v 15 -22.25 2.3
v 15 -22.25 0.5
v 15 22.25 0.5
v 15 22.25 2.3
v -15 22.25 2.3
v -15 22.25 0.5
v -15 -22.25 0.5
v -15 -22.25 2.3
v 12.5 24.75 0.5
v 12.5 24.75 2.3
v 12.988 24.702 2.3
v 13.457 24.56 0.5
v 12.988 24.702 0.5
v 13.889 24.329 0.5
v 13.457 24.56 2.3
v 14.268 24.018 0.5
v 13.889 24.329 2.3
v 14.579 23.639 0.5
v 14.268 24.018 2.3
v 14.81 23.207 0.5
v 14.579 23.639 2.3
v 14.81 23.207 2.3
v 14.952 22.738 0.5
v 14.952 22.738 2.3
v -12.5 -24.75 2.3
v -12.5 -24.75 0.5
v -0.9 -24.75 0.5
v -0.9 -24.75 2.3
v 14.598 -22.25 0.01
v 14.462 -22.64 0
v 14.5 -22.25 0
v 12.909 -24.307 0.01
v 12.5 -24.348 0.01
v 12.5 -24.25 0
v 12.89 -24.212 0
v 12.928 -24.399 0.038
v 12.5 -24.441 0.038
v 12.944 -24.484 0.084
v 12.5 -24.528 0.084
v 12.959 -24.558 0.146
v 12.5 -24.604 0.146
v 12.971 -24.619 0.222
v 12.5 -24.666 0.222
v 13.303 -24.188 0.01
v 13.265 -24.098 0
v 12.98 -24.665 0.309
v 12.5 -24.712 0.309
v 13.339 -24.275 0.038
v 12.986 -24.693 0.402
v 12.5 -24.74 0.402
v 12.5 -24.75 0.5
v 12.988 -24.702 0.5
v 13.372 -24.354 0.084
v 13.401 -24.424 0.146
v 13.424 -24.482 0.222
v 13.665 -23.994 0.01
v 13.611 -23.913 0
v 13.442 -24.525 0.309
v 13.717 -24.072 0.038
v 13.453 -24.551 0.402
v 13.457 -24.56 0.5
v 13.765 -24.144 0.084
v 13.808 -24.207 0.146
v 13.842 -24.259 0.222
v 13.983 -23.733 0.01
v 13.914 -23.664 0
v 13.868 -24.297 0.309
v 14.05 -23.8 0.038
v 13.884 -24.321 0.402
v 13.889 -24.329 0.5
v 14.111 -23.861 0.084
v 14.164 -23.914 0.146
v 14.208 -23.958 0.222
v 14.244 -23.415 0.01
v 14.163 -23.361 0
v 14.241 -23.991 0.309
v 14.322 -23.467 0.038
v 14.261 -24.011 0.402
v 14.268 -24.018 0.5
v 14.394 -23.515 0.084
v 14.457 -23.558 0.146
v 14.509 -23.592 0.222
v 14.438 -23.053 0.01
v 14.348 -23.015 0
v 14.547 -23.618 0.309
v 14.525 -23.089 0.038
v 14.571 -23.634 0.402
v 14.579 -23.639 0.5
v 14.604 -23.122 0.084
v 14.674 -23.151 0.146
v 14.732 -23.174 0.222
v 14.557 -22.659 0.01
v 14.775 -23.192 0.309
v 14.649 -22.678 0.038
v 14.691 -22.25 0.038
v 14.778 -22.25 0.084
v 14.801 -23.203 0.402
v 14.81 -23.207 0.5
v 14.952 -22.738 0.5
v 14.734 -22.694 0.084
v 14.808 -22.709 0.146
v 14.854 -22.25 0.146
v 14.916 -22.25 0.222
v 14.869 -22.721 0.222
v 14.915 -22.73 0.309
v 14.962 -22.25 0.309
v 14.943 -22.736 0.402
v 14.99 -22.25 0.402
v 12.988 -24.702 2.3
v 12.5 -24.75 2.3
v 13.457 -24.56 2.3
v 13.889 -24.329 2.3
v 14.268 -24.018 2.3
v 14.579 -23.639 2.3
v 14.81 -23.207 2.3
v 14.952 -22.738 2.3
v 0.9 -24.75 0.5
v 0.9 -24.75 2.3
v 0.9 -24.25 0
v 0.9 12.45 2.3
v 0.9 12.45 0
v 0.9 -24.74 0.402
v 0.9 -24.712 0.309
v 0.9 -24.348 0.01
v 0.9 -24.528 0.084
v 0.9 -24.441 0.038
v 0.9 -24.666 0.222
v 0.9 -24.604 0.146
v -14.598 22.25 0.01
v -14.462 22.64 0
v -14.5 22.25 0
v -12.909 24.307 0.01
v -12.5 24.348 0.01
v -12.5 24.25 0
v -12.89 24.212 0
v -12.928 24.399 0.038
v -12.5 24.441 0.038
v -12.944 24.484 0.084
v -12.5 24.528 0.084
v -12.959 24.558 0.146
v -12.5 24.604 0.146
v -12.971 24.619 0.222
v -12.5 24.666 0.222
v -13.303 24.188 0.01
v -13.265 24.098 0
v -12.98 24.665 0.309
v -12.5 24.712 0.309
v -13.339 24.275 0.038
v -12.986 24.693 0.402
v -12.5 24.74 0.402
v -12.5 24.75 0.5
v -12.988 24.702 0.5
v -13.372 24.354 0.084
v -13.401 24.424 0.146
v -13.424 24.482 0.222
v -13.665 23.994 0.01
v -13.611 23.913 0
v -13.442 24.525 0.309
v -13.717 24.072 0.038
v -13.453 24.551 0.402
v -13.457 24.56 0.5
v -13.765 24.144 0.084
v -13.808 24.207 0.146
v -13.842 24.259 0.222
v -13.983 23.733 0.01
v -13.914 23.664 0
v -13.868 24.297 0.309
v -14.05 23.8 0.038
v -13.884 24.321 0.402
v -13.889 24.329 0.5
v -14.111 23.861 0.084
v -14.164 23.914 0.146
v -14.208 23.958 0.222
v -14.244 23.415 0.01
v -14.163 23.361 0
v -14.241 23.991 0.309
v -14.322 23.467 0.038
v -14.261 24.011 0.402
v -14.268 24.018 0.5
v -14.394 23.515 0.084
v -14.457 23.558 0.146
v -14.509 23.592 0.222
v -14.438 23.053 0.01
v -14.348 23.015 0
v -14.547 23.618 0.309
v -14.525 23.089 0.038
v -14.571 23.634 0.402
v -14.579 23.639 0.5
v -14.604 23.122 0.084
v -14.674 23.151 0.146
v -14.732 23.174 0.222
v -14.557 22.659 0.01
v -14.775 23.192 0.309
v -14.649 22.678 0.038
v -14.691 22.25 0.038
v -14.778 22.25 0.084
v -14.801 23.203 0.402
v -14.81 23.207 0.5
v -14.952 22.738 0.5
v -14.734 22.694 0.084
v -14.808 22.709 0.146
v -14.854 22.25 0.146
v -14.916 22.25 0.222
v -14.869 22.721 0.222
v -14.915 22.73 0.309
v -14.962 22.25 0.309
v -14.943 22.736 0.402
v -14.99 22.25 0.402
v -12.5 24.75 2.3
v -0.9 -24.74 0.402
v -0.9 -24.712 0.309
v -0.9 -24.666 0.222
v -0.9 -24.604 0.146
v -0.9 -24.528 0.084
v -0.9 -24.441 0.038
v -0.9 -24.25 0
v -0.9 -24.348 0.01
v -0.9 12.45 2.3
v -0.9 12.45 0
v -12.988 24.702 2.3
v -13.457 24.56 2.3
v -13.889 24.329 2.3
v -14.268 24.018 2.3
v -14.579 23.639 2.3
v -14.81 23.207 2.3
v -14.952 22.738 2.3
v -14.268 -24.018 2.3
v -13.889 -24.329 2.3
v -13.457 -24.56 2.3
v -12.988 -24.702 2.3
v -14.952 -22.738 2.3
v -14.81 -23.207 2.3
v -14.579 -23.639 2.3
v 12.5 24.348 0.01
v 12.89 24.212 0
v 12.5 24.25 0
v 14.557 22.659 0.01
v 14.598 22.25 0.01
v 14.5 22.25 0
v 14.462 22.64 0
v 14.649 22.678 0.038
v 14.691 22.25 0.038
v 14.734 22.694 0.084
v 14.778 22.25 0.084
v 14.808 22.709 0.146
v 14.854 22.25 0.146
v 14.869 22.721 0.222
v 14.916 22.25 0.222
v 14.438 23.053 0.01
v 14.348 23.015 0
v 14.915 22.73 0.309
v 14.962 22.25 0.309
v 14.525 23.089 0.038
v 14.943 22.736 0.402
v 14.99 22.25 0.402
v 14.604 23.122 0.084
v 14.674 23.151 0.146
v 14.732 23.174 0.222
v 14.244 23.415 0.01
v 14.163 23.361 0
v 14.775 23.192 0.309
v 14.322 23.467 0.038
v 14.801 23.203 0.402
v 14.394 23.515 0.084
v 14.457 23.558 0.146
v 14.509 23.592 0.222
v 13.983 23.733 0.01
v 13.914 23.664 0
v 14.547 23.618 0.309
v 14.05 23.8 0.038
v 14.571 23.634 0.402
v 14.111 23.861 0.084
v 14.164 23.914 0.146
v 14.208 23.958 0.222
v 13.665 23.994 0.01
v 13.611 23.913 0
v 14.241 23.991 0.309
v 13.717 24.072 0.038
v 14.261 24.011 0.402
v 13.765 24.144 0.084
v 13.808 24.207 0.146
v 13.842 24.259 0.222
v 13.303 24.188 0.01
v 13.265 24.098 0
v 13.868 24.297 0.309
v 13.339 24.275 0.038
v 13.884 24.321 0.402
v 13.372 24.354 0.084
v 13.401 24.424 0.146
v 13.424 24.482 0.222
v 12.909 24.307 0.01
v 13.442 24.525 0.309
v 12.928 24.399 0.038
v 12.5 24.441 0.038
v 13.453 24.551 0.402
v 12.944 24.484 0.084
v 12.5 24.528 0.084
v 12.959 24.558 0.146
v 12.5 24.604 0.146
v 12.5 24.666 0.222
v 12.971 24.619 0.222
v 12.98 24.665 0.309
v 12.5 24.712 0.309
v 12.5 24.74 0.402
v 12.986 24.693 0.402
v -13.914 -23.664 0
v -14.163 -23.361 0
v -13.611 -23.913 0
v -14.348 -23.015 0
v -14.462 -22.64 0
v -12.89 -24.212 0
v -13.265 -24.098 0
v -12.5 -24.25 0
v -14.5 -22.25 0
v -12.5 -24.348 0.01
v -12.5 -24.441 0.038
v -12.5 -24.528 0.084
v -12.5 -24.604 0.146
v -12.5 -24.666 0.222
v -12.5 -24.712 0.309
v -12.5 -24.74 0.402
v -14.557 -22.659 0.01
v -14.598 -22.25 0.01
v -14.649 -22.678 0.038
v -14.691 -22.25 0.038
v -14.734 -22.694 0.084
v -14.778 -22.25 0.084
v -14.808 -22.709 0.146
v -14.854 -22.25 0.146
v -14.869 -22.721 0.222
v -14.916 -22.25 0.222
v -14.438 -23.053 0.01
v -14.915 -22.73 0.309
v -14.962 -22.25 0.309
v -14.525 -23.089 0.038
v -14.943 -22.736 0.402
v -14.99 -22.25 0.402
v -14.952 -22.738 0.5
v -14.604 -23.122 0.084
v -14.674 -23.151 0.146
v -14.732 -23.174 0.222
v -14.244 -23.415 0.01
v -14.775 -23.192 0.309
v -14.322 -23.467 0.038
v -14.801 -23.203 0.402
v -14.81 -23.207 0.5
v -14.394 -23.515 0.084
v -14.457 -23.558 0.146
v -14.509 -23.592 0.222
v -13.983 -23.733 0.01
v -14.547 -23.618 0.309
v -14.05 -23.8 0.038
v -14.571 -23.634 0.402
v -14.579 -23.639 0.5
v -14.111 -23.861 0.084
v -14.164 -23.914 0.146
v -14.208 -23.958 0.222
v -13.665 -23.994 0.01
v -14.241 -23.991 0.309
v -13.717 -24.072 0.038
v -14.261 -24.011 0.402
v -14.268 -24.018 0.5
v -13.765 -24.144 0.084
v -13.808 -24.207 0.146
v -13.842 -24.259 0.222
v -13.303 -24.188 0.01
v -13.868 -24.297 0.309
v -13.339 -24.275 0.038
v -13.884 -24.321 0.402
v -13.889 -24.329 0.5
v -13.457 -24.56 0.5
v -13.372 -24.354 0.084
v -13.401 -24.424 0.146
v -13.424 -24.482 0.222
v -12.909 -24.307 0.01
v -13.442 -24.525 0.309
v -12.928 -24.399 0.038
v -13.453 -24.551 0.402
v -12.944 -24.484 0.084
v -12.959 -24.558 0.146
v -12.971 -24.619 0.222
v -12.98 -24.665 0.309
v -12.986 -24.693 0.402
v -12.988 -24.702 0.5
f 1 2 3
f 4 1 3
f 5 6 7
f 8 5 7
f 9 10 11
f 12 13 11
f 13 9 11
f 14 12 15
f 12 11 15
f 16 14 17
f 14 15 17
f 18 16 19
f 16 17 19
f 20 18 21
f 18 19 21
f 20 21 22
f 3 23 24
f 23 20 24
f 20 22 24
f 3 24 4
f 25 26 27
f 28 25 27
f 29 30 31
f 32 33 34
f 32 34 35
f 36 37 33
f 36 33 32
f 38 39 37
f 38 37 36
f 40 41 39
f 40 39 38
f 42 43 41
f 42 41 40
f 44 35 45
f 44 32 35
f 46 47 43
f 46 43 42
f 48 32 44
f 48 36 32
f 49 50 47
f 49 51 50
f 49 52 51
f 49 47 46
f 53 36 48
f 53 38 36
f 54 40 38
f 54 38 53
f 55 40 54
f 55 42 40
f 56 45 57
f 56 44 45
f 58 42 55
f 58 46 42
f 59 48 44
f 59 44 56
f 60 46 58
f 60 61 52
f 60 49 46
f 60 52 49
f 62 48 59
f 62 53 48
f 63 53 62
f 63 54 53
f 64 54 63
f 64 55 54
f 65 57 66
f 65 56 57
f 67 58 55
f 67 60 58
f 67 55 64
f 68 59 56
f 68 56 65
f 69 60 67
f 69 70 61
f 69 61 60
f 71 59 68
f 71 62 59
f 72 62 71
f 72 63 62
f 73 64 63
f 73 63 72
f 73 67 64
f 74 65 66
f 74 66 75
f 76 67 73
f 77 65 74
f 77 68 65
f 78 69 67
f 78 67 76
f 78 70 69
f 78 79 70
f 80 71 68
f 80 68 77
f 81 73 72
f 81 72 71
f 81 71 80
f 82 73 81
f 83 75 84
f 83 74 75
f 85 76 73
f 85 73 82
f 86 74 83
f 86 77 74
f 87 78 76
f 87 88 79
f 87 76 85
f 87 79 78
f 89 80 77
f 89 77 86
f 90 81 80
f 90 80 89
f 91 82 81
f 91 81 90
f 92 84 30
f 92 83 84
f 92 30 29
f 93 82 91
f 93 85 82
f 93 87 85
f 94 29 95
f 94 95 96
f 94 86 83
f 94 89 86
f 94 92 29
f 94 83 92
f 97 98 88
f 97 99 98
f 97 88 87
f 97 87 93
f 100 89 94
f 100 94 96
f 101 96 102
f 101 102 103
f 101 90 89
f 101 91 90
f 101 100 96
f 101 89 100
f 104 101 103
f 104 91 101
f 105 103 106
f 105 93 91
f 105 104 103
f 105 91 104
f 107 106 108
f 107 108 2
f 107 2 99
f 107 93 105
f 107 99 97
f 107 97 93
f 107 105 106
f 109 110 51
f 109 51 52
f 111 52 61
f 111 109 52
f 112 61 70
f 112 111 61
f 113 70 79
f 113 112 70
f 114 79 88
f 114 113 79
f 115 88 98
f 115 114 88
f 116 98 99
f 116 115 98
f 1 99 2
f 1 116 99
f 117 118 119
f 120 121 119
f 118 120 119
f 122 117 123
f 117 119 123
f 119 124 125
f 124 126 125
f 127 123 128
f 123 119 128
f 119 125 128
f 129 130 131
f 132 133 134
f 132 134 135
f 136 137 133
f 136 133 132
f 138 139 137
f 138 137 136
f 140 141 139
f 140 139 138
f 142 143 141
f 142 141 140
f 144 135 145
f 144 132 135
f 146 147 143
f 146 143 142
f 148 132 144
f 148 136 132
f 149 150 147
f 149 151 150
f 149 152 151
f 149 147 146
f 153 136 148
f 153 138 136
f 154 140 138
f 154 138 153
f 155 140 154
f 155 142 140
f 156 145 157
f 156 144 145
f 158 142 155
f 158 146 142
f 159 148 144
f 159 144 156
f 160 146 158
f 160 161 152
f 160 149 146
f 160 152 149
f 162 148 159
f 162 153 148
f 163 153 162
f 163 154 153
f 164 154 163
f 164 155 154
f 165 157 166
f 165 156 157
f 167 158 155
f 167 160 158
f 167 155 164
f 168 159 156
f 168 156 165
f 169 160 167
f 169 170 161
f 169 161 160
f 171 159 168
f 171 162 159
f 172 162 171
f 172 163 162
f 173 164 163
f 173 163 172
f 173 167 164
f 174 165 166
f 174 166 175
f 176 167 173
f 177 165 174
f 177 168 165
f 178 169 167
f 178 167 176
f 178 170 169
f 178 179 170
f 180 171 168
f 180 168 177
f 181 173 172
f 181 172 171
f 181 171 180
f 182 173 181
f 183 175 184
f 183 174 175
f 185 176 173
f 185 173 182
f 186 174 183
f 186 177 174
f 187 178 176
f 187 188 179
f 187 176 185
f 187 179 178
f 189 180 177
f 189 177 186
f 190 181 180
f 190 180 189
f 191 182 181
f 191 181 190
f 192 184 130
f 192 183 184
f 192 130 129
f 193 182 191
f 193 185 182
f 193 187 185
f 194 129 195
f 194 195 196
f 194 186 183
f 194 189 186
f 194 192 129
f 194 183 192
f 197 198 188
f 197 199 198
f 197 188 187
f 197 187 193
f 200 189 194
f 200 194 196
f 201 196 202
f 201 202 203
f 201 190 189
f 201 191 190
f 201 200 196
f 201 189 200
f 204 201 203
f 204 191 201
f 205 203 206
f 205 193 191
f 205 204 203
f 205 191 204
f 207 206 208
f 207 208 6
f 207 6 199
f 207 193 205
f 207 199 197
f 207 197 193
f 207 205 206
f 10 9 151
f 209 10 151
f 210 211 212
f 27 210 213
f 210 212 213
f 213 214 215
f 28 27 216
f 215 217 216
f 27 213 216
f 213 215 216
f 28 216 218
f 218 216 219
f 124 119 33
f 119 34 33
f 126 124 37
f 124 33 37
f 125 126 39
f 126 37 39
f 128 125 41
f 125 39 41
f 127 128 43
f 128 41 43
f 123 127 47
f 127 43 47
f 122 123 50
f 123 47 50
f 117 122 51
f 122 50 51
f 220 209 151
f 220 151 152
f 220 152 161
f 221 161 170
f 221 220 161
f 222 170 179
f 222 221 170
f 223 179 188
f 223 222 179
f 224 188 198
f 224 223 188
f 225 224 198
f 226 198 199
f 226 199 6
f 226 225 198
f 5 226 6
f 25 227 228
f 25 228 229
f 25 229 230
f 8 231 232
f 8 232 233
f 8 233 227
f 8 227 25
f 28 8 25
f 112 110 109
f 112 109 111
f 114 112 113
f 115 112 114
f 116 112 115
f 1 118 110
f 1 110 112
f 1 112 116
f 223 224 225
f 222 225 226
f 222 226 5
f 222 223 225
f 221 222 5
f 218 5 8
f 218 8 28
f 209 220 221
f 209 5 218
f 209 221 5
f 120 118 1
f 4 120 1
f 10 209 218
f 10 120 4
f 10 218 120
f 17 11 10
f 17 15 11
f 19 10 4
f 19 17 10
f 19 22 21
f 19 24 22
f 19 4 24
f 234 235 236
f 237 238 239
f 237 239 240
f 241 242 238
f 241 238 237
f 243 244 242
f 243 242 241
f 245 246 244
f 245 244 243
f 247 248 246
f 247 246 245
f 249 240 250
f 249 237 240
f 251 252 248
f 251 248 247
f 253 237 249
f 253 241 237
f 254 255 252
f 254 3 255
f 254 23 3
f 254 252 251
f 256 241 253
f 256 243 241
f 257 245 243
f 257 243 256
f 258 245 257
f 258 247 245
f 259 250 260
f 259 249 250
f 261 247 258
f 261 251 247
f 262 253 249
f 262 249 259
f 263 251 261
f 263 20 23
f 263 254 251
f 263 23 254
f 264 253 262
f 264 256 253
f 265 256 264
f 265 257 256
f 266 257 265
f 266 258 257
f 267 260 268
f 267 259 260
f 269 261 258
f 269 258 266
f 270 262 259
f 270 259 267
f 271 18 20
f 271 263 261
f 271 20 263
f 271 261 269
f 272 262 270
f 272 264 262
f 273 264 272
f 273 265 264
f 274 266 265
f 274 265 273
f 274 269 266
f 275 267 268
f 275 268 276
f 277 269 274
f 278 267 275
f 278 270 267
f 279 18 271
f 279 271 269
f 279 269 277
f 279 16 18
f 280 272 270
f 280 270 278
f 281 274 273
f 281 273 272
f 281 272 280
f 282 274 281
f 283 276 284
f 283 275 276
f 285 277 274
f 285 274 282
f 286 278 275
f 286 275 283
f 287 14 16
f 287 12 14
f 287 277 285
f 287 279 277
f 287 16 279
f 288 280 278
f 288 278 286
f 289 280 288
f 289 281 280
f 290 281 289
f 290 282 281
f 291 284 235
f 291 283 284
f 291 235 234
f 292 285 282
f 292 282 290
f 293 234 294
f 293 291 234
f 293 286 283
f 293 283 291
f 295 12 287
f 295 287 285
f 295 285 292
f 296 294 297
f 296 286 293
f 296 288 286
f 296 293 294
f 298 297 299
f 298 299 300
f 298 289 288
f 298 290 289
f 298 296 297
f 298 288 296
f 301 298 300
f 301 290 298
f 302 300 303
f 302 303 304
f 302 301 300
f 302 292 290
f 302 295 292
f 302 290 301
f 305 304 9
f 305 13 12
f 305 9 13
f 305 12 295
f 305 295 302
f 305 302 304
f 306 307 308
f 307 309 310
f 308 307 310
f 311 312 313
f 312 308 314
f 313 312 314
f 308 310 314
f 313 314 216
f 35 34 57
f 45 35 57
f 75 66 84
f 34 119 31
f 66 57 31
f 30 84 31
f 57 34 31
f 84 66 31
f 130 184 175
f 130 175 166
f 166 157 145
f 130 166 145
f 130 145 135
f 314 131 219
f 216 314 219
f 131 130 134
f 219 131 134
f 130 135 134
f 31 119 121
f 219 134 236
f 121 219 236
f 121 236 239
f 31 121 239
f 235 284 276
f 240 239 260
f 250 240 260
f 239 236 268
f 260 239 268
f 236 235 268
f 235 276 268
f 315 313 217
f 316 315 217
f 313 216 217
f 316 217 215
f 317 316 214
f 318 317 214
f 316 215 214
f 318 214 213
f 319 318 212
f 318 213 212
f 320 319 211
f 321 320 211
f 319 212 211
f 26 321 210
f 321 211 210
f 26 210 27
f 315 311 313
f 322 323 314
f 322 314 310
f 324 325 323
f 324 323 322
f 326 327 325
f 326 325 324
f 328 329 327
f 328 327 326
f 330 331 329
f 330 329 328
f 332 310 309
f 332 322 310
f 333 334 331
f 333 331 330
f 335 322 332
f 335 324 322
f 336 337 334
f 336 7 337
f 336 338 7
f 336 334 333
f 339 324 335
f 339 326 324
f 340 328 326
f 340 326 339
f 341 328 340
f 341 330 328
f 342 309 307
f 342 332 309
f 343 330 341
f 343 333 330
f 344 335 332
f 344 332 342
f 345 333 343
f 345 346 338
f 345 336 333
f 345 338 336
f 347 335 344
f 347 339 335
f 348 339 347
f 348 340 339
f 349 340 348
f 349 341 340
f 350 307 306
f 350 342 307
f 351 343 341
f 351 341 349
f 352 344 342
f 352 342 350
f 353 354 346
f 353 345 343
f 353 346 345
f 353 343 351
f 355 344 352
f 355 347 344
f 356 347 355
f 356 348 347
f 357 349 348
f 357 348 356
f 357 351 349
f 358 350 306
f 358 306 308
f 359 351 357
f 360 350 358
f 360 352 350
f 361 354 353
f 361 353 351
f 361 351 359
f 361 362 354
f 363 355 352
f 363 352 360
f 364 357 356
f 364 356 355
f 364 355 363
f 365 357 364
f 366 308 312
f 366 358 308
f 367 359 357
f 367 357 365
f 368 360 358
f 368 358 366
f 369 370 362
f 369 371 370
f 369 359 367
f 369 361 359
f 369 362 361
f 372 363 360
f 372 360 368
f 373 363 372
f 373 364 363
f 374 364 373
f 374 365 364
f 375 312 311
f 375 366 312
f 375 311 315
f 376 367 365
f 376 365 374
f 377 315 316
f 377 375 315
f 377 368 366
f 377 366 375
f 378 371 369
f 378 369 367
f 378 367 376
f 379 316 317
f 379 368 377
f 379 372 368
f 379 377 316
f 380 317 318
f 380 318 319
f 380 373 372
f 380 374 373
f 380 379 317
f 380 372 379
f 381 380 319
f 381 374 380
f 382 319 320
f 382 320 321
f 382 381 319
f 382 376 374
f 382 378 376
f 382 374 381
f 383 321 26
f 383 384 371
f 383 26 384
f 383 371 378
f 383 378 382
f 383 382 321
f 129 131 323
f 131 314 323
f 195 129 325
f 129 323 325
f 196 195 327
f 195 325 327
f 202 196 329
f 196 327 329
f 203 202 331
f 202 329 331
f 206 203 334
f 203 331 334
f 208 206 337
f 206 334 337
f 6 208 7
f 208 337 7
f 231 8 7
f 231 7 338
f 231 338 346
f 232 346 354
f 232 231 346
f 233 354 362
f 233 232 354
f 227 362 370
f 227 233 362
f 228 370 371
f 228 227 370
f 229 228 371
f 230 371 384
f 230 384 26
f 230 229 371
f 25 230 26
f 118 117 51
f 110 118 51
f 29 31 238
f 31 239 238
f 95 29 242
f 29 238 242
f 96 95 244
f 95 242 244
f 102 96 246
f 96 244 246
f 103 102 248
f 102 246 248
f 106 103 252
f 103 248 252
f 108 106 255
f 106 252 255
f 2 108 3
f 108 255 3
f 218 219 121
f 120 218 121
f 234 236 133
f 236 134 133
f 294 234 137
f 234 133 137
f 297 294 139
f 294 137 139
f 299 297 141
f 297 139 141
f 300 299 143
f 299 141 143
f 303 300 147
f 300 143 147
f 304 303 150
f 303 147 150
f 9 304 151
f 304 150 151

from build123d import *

# Parameters (mm, degrees)
F1_DEPTH = 2.3
F2_R     = 2.5
F3_R     = 0.5


with BuildPart() as f1:
    # F0 (on Top) → F1 (new body)
    with BuildSketch(Plane.XY):
        Polygon((15, 24.75), (-15, 24.75), (-15, -24.75), (-0.9, -24.75), (-0.9, 12.45), (0.9, 12.45), (0.9, -24.75), (15, -24.75), align=None)
    extrude(amount=F1_DEPTH)

    # F2
    f2_edges = [f1.edges().sort_by_distance(p)[0] for p in [
        (-15, 24.75, 1.15),
        (-15, -24.75, 1.15),
        (15, -24.75, 1.15),
        (15, 24.75, 1.15),
    ]]
    fillet(f2_edges, radius=F2_R)

    # F3
    f3_edges = [f1.edges().sort_by_distance(p)[0] for p in [
        (6.7, -24.75, 0),
        (14.267767, -24.017767, 0),
        (15, 0, 0),
        (0, 24.75, 0),
        (14.267767, 24.017767, 0),
        (-14.267767, 24.017767, 0),
        (-15, 0, 0),
        (-14.267767, -24.017767, 0),
    ]]
    fillet(f3_edges, radius=F3_R)


solid = f1.part
